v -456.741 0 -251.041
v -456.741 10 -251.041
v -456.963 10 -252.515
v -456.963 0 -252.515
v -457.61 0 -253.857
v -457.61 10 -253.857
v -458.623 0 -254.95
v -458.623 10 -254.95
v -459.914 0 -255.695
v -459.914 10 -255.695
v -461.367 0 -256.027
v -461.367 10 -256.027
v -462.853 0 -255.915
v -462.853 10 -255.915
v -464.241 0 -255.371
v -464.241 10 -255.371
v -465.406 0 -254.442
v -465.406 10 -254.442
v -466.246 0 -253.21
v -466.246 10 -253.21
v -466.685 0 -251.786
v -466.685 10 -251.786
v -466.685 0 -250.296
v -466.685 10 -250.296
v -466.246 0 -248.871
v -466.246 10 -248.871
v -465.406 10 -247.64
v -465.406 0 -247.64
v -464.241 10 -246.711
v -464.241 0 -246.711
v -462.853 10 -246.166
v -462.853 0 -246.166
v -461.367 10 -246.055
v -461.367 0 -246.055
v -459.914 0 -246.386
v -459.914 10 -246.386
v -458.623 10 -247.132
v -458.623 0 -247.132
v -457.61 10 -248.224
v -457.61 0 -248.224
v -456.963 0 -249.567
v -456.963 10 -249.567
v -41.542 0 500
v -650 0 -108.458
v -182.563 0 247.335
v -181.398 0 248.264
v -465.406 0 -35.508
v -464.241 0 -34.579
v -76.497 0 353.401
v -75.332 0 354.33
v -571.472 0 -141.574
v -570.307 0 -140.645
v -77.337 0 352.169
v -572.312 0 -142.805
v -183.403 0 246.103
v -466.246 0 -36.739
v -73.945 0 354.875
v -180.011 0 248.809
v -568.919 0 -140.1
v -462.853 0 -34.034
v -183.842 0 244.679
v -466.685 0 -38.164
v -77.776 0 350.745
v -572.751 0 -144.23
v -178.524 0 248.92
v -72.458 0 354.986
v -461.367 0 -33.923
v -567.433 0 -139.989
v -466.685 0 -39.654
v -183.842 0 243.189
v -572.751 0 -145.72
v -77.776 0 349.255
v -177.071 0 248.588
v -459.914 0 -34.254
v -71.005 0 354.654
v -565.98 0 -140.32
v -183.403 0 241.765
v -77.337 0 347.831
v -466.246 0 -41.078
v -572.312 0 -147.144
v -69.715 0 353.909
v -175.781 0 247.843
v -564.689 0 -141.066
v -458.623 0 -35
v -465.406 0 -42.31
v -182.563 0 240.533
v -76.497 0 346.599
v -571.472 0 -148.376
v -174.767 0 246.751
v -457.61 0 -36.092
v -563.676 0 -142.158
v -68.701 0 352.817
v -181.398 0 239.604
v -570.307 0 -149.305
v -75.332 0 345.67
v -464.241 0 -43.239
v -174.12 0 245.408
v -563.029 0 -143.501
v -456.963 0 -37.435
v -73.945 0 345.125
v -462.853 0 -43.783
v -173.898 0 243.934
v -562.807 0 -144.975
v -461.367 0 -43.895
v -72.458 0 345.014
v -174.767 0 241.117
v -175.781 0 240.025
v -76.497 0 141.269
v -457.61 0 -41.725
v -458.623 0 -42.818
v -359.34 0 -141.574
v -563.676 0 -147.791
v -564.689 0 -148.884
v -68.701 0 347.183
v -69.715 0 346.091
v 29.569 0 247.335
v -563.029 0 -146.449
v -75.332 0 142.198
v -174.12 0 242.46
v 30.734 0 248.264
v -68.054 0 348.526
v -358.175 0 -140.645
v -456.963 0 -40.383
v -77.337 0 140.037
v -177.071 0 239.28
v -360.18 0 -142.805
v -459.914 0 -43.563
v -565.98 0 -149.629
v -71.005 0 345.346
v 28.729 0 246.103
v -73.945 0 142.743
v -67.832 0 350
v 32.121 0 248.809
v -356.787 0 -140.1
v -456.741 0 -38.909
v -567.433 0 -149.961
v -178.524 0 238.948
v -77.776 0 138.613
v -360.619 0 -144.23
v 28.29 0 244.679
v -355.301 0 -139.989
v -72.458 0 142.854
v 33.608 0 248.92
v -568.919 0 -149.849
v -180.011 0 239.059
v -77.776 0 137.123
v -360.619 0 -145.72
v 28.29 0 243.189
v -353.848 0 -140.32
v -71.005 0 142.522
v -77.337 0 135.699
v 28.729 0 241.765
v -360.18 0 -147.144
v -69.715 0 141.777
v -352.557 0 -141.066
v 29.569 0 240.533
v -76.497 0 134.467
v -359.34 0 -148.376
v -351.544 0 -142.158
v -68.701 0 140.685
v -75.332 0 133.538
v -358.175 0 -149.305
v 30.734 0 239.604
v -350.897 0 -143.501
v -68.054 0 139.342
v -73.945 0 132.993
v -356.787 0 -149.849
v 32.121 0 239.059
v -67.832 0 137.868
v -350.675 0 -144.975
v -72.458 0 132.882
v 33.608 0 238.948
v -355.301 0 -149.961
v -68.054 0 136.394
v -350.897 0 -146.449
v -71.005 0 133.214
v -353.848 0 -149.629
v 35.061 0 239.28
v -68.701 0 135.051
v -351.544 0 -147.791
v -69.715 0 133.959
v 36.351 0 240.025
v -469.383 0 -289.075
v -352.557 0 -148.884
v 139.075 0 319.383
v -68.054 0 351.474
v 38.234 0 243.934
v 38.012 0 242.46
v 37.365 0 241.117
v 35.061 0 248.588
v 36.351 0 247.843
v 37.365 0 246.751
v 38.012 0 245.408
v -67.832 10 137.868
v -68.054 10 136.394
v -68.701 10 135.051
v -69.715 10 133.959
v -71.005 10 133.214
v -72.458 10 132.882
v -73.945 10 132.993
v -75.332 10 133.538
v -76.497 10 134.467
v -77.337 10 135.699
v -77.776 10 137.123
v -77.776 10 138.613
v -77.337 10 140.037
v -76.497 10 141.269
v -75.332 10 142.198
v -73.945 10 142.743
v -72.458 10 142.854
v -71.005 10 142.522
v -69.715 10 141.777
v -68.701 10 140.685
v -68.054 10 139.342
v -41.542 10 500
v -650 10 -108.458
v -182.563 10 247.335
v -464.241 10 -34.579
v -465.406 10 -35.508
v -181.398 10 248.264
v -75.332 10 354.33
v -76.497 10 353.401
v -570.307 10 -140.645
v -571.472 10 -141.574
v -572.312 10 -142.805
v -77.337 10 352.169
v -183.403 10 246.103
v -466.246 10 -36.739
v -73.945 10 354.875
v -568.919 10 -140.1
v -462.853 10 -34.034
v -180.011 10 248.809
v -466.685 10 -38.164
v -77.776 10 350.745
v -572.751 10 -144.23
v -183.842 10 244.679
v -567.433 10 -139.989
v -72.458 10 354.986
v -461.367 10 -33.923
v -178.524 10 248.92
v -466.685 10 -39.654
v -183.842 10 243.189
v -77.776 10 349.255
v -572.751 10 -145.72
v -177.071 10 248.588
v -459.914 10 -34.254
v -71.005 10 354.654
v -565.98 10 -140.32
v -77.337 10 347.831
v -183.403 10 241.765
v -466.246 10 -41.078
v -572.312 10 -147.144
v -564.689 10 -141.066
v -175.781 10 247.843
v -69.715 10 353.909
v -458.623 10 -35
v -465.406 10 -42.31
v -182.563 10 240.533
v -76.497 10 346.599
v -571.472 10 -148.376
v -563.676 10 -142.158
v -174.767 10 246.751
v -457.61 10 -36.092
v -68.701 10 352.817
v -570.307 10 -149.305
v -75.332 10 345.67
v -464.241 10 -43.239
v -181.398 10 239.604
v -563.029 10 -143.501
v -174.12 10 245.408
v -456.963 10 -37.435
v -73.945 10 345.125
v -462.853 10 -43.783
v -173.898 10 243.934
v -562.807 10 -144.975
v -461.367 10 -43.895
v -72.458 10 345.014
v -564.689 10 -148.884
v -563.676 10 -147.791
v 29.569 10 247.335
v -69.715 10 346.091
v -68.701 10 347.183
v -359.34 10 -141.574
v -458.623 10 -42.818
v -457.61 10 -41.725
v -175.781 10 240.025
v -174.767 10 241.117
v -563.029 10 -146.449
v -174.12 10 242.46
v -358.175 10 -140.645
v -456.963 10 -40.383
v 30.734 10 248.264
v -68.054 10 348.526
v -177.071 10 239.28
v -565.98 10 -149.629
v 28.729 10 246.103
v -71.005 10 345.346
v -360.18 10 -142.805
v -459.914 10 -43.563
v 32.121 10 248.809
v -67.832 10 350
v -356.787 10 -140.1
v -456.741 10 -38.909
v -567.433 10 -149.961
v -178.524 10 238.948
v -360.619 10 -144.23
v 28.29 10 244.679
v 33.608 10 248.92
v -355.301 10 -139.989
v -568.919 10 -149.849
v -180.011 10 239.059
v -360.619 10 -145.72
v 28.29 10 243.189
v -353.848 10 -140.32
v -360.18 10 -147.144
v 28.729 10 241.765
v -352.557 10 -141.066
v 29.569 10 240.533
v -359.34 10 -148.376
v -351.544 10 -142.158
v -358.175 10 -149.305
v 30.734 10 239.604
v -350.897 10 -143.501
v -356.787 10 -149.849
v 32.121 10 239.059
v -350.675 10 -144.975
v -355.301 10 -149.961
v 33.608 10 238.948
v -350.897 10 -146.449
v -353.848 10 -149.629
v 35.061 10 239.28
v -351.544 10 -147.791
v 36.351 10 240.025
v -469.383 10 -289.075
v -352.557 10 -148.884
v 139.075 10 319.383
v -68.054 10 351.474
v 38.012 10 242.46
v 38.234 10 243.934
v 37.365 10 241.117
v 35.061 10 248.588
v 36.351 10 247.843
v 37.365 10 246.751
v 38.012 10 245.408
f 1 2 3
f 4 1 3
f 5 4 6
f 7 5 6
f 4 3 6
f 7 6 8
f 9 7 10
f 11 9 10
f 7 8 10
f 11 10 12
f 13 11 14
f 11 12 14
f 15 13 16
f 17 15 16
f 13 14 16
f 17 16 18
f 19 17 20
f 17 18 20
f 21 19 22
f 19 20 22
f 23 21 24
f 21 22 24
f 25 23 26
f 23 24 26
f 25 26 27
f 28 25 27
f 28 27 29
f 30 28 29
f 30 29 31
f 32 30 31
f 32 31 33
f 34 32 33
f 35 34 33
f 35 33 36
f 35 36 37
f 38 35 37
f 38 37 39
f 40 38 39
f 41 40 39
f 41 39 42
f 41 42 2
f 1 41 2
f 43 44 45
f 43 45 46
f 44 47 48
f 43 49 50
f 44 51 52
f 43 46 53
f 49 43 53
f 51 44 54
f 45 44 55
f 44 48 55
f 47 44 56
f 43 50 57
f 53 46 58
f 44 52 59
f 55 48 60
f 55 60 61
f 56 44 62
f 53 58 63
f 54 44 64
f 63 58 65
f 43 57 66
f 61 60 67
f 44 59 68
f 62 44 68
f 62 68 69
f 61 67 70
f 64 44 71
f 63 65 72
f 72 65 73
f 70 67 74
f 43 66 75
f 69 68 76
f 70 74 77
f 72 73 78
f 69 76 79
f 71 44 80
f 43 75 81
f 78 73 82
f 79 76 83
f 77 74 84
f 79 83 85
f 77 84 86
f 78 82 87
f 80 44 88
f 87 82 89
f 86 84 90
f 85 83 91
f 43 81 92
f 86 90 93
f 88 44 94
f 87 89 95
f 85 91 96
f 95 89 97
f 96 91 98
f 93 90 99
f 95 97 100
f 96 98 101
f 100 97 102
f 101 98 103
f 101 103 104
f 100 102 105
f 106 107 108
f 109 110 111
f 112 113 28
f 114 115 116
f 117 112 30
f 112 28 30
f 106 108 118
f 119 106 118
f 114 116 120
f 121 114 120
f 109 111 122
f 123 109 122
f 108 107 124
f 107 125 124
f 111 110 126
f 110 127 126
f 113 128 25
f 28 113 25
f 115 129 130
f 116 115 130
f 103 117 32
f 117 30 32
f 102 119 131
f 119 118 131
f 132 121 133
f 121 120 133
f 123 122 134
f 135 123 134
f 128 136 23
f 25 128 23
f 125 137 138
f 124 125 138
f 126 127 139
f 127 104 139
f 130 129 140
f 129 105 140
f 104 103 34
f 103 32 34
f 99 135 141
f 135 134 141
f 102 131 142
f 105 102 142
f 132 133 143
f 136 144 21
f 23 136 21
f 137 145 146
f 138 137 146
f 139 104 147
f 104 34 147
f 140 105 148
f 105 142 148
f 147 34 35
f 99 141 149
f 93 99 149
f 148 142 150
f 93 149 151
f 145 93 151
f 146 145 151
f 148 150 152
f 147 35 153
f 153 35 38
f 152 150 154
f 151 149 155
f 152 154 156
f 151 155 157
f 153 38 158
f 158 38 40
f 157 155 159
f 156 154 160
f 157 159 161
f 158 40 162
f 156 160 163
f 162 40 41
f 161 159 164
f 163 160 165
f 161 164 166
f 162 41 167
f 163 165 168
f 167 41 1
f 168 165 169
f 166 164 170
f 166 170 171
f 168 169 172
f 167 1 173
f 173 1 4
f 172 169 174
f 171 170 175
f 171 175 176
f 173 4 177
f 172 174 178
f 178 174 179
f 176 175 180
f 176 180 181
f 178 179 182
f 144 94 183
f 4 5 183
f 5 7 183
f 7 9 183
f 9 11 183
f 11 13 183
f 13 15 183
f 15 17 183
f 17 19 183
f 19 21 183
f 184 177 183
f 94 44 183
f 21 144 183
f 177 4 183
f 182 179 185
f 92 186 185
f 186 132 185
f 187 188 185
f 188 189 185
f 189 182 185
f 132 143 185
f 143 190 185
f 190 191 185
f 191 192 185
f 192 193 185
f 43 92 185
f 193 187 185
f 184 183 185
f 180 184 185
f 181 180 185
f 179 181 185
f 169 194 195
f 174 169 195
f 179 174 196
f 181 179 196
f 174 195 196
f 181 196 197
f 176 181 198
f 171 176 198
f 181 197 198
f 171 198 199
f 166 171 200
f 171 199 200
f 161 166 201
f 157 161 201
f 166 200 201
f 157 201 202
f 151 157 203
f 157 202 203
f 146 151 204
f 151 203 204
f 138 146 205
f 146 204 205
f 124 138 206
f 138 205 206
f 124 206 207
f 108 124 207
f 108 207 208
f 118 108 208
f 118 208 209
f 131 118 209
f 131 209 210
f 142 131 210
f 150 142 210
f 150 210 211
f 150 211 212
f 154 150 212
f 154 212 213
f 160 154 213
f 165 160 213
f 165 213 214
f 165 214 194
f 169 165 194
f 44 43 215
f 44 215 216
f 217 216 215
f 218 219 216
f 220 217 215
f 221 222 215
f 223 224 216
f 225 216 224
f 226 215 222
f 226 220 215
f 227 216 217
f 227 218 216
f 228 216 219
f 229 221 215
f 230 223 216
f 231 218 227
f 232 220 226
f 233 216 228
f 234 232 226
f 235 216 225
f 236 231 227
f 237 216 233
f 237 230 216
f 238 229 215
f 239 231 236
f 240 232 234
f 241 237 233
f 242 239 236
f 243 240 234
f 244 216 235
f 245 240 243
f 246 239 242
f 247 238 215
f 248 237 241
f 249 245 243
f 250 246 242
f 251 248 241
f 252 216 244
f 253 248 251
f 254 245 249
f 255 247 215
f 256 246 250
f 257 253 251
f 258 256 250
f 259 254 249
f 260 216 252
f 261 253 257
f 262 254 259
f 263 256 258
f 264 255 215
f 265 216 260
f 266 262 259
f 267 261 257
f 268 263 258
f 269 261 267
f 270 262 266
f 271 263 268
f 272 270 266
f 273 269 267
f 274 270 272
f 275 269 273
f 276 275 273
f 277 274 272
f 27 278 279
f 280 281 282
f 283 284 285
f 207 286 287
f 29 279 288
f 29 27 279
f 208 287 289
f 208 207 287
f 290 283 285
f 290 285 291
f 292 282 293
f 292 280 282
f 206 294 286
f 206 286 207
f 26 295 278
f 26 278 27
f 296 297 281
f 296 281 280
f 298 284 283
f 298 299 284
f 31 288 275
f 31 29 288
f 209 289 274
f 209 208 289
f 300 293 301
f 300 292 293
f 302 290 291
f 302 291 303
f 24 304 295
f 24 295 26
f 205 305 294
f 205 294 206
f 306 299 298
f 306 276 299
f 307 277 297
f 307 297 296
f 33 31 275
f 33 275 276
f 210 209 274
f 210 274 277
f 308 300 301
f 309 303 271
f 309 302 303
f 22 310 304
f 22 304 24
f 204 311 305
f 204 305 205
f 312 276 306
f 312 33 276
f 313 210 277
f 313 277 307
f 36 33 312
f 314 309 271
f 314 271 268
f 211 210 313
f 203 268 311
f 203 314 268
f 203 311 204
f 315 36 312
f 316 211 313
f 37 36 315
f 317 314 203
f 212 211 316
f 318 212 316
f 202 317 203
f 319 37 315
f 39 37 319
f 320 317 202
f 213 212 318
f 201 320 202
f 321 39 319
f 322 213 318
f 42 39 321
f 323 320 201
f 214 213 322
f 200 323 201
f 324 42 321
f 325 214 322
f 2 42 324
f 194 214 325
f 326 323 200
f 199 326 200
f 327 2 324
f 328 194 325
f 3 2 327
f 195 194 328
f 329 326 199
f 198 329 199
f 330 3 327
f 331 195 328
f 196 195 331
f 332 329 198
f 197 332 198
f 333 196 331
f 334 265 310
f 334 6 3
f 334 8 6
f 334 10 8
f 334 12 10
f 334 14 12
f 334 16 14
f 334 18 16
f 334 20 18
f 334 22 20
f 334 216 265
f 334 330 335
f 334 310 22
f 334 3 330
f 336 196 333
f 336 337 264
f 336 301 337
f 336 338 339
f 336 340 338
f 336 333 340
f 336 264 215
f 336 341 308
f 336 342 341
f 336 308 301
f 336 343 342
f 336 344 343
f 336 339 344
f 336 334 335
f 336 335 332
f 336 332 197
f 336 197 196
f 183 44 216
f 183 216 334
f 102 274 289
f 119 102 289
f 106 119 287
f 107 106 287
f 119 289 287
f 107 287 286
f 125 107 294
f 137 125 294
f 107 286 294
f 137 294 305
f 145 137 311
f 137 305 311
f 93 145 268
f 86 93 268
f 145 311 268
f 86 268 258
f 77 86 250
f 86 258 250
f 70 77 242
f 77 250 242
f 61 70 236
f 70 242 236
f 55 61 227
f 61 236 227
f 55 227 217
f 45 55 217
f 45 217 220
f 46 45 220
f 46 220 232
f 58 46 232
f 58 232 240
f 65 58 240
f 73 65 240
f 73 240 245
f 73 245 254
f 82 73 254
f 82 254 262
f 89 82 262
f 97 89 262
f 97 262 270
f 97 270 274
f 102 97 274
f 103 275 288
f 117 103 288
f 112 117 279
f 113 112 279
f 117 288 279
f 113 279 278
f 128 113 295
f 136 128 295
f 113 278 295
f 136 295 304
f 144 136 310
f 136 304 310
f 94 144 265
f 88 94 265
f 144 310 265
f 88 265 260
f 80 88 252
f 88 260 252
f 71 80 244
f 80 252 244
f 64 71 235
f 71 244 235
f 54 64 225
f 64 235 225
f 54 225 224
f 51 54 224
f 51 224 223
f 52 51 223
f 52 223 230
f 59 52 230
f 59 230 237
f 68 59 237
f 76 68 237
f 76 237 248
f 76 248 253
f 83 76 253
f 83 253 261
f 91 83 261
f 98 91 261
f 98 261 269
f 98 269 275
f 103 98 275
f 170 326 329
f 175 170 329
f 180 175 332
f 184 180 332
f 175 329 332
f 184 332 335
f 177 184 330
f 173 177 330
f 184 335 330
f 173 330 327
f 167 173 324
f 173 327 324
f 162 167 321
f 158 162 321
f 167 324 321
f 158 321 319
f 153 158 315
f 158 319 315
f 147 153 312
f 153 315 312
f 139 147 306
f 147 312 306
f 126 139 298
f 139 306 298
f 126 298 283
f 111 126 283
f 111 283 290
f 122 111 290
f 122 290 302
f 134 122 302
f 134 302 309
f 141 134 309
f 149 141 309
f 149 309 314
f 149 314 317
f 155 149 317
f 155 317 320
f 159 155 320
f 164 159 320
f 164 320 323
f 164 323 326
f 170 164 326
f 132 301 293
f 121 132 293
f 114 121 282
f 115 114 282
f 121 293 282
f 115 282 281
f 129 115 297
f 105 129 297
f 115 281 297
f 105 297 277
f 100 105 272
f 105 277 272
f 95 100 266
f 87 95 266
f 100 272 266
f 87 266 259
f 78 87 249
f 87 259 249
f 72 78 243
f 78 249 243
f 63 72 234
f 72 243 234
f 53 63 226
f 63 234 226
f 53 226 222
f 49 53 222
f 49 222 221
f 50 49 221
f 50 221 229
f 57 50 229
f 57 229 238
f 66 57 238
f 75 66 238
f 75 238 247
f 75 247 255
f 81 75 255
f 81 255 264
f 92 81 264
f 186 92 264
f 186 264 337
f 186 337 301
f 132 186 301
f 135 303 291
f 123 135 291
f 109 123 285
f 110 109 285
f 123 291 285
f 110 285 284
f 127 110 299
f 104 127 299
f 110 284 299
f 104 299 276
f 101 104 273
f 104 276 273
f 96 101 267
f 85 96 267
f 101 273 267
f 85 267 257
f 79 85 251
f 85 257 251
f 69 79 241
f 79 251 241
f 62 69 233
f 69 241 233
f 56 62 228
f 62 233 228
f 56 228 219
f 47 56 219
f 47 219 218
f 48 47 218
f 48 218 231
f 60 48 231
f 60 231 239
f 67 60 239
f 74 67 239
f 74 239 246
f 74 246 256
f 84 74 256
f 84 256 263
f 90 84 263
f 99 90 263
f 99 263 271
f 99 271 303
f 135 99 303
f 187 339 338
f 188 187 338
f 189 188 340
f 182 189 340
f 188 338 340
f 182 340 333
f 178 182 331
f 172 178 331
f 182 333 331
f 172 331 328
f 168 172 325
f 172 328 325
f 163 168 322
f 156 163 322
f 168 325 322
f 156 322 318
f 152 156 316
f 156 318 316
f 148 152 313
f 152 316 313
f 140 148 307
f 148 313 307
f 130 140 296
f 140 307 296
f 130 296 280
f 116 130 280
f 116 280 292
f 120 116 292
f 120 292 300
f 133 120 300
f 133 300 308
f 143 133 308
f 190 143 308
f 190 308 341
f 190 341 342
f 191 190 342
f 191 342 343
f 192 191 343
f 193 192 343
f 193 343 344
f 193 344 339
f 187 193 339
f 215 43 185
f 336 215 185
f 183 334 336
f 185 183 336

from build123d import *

# Parameters (mm, degrees)
CROQUIS2_W              = 1300
CROQUIS2_H              = 1000
SALIENTE_EXTRUIR1_DEPTH = 10
CROQUIS3_R              = 5
CORTAR_EXTRUIR1_DEPTH   = 11
CORTAR_EXTRUIR2_DEPTH   = 10
CORTAR_EXTRUIR3_DEPTH   = 10
CUT_EXTRUDE1_DEPTH      = 11


with BuildPart() as part:
    # Croquis2 → Saliente-Extruir1 (new body)
    with BuildSketch(Plane(origin=(0, 0, 0), x_dir=(1, 0, 0), z_dir=(0, 1, 0))):
        Rectangle(CROQUIS2_W, CROQUIS2_H)
    extrude(amount=SALIENTE_EXTRUIR1_DEPTH)

    # Croquis3 → Cortar-Extruir1 (cut, through all)
    with BuildSketch(Plane(origin=(0, 10, 0), x_dir=(1, 0, 0), z_dir=(0, 1, 0))):
        with Locations((-72.831998462, -137.867965644)):
            Circle(CROQUIS3_R)
        with Locations((33.234018716, -243.933982822)):
            Circle(CROQUIS3_R)
        with Locations((-72.831998462, -350)):
            Circle(CROQUIS3_R)
        with Locations((-178.89801564, -243.933982822)):
            Circle(CROQUIS3_R)
        with Locations((-461.740728115, 251.040764009)):
            Circle(CROQUIS3_R)
        with Locations((-355.674710937, 144.974746831)):
            Circle(CROQUIS3_R)
        with Locations((-461.740728115, 38.908729653)):
            Circle(CROQUIS3_R)
        with Locations((-567.806745293, 144.974746831)):
            Circle(CROQUIS3_R)
    extrude(amount=-CORTAR_EXTRUIR1_DEPTH, mode=Mode.SUBTRACT)

    # Croquis5 → Cortar-Extruir2 (cut)
    with BuildSketch(Plane(origin=(0, 0, 0), x_dir=(1, 0, 0), z_dir=(0, 1, 0))):
        Polygon((0, 0), (-500, 500), (650, 500), (650, -500), (500, -500), align=None)
        Polygon((-41.541714007, -500), (-650, 108.458285993), (-650, -500), align=None)
    extrude(amount=CORTAR_EXTRUIR2_DEPTH, mode=Mode.SUBTRACT)

    # Croquis6 → Cortar-Extruir3 (cut)
    with BuildSketch(Plane(origin=(0, 0, 0), x_dir=(1, 0, 0), z_dir=(0, 1, 0))):
        Polygon((-650, 108.458285993), (-379.229142997, 379.229142997), (-500, 500), (-650, 500), align=None)
        Polygon((-41.541714007, -500), (229.229142997, -229.229142997), (500, -500), align=None)
    extrude(amount=CORTAR_EXTRUIR3_DEPTH, mode=Mode.SUBTRACT)

    # Sketch1 → Cut-Extrude1 (cut, through all)
    with BuildSketch(Plane(origin=(0, 10, 0), x_dir=(1, 0, 0), z_dir=(0, 1, 0))):
        Polygon((-379.229142997, 379.229142997), (-469.383041958, 289.075244036), (139.075244036, -319.383041958), (229.229142997, -229.229142997), align=None)
    extrude(amount=-CUT_EXTRUDE1_DEPTH, mode=Mode.SUBTRACT)


solid = part.part
